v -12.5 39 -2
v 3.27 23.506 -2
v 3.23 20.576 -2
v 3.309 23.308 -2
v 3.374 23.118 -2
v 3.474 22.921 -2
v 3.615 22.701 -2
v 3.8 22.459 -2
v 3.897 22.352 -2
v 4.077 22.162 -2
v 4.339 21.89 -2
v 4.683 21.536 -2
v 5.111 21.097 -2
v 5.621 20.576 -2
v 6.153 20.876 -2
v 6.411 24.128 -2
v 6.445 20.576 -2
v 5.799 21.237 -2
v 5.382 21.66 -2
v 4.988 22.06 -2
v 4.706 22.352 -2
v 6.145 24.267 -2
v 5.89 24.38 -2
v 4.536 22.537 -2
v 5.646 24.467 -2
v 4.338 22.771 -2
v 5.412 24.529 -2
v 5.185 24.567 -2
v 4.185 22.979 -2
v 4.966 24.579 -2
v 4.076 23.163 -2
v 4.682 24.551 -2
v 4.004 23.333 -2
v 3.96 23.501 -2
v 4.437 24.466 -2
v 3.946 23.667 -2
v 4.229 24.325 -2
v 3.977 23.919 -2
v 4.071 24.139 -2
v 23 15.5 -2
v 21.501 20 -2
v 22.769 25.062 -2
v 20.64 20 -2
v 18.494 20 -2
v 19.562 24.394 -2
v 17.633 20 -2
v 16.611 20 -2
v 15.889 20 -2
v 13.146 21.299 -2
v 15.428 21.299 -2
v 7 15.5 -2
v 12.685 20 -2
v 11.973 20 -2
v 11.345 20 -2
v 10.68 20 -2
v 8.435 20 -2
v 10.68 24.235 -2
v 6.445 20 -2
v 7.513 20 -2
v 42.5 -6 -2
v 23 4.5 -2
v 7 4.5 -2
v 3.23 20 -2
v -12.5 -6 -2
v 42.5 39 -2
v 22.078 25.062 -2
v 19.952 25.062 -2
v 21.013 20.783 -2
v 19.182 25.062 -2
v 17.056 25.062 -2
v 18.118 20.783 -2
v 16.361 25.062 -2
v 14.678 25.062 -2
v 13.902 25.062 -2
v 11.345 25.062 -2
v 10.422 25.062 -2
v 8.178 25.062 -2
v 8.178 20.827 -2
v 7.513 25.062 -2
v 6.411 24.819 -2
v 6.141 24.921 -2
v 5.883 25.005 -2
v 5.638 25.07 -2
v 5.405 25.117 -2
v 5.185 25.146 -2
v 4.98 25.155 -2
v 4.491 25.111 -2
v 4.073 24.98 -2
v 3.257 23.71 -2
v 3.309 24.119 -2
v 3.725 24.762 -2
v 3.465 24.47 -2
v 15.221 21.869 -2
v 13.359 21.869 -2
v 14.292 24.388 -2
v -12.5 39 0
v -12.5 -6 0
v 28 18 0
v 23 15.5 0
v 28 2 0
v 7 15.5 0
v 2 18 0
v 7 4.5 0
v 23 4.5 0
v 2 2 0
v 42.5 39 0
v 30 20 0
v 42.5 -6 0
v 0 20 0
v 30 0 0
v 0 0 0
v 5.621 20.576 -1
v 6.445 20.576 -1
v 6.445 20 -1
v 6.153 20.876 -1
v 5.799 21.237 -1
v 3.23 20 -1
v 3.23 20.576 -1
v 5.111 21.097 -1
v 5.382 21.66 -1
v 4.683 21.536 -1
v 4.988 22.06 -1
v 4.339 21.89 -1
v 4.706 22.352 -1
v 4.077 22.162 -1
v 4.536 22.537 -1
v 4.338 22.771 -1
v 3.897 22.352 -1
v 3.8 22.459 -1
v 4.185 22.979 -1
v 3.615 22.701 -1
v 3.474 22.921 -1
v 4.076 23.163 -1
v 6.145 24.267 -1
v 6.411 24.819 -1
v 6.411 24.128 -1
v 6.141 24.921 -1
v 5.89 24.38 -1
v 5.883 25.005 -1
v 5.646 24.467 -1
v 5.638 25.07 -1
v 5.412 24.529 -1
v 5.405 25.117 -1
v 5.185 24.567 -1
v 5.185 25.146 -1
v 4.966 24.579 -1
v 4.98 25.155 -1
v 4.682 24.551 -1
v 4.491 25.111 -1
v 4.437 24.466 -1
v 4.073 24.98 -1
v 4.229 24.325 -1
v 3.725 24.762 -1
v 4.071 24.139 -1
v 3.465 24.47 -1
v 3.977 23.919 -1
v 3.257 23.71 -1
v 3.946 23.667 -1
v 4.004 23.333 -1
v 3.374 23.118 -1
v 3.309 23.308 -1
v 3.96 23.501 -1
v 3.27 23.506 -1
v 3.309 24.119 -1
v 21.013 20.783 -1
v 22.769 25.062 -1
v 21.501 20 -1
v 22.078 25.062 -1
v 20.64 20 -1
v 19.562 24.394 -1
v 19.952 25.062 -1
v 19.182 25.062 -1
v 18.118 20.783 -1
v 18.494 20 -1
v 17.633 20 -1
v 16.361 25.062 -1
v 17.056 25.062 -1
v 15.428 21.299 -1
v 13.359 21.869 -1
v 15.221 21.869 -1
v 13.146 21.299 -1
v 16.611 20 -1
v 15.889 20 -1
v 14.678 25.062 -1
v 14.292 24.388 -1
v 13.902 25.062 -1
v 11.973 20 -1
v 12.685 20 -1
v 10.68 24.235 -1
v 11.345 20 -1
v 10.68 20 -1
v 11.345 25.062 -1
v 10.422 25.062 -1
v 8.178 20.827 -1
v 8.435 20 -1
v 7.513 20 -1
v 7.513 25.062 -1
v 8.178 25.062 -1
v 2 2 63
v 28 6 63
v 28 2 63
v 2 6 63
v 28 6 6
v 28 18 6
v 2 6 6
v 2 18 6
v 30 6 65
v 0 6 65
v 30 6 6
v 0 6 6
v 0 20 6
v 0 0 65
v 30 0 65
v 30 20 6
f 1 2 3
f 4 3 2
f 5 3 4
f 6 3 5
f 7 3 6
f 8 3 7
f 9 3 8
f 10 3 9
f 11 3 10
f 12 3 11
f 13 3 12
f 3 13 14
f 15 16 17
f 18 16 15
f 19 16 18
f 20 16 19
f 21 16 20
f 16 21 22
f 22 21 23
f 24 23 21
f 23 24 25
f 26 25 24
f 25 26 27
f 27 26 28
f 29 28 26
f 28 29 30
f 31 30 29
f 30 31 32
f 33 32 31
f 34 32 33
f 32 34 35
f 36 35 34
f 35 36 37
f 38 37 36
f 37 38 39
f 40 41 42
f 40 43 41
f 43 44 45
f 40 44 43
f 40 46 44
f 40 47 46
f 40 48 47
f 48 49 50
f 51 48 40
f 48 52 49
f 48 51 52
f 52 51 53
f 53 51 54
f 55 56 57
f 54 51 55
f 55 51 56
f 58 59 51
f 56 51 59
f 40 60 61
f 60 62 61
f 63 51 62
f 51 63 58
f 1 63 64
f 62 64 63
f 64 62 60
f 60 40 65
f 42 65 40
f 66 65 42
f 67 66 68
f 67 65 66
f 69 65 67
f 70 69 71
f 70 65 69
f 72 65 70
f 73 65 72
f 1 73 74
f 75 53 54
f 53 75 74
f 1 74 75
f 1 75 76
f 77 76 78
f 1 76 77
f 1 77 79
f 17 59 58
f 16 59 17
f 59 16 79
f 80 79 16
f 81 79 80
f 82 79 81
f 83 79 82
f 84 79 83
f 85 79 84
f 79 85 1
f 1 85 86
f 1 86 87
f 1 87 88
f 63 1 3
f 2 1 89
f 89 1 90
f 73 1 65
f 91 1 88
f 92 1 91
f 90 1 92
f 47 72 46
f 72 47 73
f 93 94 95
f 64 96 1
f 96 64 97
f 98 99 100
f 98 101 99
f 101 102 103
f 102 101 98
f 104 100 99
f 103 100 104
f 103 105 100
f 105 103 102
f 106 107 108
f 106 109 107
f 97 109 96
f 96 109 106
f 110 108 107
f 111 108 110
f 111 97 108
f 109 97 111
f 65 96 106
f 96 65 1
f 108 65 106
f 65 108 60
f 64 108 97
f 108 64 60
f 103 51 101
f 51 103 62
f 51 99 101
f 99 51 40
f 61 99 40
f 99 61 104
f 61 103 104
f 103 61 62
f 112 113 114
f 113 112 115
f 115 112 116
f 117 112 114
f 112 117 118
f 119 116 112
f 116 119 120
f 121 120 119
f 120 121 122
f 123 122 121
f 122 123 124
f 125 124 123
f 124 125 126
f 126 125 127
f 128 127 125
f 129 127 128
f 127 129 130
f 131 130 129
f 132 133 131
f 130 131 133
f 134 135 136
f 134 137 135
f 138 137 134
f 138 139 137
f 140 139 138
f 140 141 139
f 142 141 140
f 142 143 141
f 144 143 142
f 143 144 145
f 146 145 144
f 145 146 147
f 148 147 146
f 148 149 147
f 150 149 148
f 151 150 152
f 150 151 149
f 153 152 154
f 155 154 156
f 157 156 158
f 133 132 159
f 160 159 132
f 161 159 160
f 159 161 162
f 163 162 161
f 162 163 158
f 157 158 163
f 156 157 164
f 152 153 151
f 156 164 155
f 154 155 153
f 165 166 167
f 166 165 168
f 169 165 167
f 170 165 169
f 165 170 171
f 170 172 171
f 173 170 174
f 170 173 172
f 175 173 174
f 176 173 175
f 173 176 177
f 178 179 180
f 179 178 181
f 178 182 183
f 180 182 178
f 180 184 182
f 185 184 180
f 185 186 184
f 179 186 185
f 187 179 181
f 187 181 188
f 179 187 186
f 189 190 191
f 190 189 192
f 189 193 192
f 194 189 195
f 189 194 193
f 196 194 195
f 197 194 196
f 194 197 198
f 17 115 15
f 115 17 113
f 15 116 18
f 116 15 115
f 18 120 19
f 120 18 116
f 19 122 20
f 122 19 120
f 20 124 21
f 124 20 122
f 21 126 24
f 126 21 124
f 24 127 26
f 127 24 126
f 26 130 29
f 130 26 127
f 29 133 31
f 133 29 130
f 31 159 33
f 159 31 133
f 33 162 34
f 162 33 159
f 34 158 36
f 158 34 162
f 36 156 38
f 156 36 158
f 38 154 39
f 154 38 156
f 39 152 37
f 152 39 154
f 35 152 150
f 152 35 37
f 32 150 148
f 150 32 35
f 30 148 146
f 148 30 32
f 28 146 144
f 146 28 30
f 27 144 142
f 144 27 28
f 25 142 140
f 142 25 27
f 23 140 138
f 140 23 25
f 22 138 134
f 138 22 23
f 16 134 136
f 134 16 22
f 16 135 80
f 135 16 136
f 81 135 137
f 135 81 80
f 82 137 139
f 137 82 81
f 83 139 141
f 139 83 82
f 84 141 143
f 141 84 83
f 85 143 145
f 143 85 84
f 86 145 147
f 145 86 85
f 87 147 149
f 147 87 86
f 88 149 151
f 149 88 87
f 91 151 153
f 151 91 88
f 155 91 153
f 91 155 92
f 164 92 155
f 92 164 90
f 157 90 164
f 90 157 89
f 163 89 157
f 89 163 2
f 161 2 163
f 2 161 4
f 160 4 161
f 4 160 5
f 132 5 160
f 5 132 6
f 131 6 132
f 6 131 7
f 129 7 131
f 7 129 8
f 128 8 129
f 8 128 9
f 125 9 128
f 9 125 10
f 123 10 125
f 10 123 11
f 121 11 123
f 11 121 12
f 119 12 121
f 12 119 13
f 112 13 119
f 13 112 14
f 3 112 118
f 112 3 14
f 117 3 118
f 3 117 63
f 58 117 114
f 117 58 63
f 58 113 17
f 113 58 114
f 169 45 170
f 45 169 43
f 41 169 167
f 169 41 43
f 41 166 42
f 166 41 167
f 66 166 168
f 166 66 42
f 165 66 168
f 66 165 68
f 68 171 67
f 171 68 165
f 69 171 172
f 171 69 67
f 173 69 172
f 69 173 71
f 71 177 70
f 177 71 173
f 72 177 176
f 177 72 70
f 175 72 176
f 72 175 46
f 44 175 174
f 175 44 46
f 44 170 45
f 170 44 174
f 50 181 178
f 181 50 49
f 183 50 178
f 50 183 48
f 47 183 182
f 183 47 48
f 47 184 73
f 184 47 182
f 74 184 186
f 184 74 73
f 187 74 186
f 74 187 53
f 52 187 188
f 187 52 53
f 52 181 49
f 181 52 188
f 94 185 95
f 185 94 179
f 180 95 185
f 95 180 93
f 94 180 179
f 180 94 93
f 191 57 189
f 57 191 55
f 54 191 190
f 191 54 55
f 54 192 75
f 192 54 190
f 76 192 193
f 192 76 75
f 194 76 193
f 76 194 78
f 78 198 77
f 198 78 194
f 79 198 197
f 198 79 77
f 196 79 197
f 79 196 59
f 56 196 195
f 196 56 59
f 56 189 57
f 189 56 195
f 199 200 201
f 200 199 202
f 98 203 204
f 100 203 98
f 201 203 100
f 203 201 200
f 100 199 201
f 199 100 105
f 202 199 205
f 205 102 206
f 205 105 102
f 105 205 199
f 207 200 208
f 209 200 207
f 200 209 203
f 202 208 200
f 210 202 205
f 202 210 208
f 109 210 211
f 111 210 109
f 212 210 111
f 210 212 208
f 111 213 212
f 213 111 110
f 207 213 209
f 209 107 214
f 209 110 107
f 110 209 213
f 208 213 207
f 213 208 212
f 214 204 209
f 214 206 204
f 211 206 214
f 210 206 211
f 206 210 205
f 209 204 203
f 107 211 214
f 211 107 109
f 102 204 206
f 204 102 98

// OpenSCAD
eps=1;

eth_z=63;

linear_extrude(eth_z) {
    square([2,6]);
    translate([28,0,0]) square([2,6]);
    square([30,2]);
}

translate([0,0,eth_z]) linear_extrude(2) square([30,6]);

translate([0,18,0]) linear_extrude(6) square([30,2]);

linear_extrude(6) {
    square([2,18]);
    translate([28,0,0]) square([2,18]);
}

difference() {
    translate([-12.5,-6,-2]) linear_extrude(2) square([55,45]);
    translate([7,4.5,-2-eps/2]) linear_extrude(2+eps) square([16,11]);
    translate([16+7,20,-2-eps]) linear_extrude(1+eps) 
        mirror([1,0,0])
            text(text="WAN2",size=5, font="Lucida Console:style=Regular");
}
